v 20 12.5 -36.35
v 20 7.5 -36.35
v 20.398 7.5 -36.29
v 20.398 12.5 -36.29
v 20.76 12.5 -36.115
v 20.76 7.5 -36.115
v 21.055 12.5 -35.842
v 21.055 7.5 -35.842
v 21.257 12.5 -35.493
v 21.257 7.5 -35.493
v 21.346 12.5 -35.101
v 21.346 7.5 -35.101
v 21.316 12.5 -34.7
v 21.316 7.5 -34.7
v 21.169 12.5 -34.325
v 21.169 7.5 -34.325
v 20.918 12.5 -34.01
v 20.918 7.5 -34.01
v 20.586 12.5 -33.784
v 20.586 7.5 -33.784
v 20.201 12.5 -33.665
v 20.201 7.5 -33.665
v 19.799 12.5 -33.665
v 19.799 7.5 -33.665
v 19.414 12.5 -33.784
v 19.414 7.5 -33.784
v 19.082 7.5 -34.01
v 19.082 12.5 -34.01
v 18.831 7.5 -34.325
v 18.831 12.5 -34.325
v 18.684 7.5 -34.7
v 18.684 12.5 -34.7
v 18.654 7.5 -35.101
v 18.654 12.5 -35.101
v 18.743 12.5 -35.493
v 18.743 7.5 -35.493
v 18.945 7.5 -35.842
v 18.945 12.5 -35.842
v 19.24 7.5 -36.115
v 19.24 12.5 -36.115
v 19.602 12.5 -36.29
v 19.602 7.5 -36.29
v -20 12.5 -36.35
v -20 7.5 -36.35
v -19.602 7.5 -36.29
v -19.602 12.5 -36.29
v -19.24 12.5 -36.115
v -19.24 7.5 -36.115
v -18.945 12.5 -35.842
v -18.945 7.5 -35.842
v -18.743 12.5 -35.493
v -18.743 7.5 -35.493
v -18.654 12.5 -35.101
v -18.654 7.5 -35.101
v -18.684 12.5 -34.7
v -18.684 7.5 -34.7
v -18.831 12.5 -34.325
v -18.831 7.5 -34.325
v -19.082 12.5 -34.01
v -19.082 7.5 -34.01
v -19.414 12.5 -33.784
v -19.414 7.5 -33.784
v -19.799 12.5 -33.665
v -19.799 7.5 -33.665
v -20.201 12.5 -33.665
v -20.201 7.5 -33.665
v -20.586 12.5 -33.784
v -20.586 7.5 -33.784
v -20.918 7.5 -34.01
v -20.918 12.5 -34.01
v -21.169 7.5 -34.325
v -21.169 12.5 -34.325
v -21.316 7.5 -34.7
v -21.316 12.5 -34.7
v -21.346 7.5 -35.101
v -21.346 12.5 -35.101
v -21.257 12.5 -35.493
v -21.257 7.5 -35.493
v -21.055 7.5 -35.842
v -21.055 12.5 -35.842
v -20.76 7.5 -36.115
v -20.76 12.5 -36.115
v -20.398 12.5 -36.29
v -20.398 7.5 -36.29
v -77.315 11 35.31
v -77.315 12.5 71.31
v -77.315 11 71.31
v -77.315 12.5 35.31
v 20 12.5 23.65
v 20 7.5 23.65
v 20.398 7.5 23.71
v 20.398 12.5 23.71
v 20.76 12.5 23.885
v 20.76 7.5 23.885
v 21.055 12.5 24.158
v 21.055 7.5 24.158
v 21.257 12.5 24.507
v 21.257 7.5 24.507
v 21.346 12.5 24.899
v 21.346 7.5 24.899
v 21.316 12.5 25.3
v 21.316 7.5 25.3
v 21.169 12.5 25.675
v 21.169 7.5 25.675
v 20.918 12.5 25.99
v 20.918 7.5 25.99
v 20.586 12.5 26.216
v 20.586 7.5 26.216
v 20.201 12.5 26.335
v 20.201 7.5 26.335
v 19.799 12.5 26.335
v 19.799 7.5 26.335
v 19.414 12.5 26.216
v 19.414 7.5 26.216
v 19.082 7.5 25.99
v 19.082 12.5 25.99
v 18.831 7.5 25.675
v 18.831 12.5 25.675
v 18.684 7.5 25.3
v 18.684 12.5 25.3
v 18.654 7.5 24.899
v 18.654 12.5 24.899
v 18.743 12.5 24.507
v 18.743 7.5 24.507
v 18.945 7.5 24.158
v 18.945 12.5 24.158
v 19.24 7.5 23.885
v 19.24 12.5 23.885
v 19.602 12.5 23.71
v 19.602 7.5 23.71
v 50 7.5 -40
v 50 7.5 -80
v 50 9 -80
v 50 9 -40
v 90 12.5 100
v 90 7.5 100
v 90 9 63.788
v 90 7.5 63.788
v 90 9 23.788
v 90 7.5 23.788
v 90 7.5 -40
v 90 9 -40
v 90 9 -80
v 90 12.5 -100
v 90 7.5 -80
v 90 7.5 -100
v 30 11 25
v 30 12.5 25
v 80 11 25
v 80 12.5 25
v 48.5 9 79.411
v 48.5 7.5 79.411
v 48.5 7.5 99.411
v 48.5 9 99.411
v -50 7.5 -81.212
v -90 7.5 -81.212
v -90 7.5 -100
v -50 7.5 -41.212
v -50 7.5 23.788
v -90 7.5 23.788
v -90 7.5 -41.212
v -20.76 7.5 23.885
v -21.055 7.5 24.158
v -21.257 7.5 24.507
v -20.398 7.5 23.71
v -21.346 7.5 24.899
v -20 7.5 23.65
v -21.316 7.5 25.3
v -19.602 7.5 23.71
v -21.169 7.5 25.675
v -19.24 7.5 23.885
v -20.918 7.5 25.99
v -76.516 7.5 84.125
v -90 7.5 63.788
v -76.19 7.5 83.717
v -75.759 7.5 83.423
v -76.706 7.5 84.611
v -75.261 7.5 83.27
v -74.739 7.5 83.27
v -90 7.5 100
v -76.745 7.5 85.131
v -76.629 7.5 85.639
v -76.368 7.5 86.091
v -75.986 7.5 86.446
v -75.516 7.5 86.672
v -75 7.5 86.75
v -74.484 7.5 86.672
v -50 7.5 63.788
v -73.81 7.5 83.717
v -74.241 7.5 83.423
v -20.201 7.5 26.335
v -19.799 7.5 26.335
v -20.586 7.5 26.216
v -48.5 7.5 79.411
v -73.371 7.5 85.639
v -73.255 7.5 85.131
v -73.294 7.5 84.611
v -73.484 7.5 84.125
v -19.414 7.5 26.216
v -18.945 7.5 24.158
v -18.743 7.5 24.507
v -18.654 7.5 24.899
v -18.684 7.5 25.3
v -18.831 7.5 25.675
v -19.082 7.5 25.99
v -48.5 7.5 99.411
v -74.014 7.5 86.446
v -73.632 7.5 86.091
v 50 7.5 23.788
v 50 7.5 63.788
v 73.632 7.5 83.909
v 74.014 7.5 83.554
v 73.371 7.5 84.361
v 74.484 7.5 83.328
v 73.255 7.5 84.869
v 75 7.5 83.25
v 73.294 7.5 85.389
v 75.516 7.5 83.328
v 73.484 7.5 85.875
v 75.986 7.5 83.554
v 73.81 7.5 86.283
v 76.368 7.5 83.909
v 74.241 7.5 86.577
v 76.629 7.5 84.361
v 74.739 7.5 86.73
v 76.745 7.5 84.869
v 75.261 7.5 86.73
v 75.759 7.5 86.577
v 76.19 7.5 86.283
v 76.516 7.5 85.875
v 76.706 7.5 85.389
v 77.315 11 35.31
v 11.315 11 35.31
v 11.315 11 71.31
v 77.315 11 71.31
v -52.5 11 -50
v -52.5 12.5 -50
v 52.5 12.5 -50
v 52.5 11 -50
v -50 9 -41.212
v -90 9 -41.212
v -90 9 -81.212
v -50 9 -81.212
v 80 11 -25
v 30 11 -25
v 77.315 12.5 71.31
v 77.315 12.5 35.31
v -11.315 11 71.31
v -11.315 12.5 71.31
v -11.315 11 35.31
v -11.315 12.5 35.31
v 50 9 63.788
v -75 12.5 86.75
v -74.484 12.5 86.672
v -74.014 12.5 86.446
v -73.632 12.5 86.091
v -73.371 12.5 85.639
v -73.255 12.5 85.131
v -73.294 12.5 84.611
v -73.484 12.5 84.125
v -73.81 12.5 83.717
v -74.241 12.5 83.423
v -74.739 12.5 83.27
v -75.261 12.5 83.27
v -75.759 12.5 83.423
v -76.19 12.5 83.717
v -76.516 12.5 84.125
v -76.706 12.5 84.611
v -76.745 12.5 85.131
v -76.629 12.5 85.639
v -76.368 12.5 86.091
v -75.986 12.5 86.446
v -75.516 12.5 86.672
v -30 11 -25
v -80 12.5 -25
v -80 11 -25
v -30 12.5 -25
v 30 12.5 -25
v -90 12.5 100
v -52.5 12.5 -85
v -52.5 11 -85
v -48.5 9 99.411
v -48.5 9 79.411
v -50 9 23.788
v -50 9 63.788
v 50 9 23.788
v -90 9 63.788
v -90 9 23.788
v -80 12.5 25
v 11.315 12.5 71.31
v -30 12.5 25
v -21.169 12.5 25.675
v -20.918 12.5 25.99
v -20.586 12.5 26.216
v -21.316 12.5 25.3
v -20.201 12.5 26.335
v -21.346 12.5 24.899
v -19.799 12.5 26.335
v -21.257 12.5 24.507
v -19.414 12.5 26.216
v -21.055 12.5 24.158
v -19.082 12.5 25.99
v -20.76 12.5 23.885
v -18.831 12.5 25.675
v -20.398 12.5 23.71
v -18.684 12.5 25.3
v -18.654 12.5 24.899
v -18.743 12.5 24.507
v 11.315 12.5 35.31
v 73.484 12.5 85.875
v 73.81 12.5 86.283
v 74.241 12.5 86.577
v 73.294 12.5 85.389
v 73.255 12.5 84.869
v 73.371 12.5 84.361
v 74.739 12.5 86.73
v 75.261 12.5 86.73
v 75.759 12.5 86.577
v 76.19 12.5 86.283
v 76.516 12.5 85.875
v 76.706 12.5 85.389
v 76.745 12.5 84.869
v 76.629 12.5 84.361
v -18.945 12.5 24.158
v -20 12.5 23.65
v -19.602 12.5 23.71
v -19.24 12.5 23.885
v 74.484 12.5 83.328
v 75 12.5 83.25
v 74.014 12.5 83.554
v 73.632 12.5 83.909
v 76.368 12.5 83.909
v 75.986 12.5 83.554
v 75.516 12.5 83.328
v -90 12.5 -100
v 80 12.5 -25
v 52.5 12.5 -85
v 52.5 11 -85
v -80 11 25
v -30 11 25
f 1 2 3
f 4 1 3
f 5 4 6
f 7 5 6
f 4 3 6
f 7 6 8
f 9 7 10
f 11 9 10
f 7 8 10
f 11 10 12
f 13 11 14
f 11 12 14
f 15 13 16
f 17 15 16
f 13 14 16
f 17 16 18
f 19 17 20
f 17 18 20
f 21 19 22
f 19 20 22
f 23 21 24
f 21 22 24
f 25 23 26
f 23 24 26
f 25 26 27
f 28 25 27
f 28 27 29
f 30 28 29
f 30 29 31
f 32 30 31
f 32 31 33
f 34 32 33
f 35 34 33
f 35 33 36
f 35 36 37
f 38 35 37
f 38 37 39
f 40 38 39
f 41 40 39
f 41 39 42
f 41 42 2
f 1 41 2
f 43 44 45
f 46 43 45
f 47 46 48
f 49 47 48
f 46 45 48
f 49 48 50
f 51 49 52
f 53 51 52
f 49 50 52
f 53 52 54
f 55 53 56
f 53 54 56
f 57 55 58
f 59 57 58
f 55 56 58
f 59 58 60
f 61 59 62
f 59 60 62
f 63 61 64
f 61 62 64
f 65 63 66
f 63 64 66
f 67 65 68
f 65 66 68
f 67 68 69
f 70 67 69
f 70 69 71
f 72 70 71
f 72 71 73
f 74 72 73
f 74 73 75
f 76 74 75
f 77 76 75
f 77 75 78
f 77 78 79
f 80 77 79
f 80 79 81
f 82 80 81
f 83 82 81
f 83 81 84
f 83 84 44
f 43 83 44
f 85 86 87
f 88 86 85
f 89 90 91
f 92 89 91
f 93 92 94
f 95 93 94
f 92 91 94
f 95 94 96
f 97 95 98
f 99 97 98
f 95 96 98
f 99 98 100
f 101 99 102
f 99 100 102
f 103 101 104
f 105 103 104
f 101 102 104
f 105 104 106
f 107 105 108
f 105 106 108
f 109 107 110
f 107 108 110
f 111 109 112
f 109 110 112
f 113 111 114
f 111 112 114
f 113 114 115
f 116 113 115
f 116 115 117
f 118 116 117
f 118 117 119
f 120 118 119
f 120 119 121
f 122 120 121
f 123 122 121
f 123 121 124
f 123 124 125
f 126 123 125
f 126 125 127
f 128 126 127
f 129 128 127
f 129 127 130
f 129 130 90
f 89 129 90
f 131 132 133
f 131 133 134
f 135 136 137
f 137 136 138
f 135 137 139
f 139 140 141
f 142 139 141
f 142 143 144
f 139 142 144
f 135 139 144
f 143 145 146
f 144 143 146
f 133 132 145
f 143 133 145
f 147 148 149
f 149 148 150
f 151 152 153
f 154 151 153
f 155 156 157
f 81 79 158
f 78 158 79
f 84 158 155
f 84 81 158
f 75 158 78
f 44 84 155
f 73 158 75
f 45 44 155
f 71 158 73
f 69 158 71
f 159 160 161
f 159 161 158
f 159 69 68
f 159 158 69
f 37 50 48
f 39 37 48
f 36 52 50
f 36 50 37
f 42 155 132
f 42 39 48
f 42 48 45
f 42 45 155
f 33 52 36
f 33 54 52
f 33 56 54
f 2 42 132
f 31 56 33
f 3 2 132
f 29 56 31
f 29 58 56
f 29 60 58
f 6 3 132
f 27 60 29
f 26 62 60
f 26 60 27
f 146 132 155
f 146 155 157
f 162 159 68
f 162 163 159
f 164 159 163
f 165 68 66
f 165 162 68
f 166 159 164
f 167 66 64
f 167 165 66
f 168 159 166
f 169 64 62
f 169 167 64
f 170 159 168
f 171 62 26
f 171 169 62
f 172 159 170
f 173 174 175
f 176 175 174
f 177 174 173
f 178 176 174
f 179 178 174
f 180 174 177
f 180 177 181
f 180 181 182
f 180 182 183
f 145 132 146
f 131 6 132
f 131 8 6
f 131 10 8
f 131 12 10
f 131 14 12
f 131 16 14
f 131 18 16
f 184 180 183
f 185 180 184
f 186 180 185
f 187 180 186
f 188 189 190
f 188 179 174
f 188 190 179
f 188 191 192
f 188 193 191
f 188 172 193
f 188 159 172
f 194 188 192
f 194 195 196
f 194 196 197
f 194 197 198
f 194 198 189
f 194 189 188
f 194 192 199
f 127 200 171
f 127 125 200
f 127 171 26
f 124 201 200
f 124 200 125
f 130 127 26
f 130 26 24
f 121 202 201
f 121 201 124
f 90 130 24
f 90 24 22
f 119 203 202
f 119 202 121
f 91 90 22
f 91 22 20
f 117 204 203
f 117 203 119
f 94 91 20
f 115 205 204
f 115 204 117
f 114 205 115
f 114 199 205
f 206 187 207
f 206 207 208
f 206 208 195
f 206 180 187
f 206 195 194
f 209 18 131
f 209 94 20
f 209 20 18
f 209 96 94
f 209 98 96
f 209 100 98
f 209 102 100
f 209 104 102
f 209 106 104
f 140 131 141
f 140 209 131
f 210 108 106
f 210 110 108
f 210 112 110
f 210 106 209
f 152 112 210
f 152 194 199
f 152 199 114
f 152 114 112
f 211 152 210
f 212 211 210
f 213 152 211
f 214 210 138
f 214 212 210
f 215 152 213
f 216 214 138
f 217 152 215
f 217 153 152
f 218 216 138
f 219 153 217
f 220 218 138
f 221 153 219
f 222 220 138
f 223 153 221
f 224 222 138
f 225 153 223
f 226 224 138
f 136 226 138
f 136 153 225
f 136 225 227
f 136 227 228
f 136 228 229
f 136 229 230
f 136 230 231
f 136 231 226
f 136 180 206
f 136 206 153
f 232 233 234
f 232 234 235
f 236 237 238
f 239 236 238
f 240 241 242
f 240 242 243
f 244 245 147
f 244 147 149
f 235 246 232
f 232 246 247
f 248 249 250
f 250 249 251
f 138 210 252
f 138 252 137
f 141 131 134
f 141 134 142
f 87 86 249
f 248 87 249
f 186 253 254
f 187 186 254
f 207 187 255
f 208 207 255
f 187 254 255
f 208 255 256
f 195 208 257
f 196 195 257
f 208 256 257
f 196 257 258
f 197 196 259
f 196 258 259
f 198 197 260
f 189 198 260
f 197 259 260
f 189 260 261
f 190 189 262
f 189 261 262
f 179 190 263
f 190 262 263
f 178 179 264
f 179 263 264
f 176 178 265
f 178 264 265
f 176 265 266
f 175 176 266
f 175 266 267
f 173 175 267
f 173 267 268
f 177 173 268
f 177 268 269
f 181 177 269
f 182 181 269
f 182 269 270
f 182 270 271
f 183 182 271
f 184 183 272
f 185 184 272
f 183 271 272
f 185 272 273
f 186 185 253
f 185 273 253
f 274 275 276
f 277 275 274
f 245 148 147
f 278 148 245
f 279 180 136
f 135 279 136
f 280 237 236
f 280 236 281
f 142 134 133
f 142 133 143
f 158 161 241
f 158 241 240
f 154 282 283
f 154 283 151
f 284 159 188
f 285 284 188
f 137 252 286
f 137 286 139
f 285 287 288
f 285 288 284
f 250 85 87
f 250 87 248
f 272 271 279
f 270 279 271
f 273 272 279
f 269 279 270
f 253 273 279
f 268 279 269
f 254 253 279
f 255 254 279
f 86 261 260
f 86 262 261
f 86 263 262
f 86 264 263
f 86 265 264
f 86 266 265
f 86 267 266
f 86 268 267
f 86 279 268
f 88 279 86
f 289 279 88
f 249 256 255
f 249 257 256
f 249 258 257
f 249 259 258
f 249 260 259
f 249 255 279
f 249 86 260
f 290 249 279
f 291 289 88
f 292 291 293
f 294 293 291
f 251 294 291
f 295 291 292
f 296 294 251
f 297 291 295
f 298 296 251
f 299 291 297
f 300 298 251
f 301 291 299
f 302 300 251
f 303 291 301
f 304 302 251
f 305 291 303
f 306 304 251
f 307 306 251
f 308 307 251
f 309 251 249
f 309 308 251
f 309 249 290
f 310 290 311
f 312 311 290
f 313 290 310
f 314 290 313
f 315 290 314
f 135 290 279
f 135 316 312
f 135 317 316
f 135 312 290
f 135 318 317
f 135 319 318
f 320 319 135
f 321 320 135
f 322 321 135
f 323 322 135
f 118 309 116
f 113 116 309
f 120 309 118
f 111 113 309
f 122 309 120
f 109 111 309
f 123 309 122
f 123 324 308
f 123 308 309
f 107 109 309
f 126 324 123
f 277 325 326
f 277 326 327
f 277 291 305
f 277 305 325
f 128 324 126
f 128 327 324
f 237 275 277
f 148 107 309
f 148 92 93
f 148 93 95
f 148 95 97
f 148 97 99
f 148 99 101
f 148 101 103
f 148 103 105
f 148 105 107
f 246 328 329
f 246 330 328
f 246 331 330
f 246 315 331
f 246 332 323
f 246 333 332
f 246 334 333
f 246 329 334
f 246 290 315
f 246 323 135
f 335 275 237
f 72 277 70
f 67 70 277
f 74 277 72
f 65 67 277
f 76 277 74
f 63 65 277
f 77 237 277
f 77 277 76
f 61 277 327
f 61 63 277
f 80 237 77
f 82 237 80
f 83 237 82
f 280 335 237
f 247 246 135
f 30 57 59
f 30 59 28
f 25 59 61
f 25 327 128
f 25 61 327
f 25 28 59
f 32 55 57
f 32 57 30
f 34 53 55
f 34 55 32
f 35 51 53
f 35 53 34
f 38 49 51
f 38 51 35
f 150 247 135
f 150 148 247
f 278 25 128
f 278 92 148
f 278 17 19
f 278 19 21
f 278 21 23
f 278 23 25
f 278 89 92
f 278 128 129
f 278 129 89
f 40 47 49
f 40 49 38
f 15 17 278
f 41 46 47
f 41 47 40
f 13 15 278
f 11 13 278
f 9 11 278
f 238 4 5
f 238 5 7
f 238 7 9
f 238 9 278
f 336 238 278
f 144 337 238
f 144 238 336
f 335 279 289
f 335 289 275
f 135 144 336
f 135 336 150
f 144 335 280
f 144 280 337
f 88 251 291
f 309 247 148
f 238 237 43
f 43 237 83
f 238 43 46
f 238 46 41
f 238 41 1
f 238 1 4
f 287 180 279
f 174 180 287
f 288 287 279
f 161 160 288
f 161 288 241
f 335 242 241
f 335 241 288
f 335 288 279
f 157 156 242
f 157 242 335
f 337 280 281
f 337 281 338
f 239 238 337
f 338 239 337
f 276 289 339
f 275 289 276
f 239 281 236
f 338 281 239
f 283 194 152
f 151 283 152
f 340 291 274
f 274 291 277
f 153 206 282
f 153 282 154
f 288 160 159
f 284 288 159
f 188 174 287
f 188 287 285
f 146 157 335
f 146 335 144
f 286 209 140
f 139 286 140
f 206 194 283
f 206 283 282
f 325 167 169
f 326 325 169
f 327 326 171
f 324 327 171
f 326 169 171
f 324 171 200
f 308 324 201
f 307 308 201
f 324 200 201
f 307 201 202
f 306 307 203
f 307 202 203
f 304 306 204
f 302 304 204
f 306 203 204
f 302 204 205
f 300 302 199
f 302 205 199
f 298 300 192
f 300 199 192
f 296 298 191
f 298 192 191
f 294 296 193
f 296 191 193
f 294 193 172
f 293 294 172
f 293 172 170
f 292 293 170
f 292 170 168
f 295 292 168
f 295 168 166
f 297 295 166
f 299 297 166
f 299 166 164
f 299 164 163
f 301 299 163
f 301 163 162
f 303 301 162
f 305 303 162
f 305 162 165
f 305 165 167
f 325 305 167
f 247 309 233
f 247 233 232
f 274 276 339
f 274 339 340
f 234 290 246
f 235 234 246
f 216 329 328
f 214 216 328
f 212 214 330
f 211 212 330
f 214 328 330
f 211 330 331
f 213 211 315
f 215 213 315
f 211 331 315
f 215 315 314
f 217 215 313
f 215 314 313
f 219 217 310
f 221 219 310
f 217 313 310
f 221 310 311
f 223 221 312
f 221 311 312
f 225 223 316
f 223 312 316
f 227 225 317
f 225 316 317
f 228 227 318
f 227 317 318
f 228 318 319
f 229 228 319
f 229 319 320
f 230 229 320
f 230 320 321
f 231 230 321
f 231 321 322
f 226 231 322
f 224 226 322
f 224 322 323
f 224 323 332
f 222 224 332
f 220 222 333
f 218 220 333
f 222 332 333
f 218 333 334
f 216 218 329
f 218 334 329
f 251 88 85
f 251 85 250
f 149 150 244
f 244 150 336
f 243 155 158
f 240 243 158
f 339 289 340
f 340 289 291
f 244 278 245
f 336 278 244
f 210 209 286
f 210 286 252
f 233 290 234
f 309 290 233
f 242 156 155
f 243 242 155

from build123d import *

# Parameters (mm, degrees)
SKETCH1_W           = 180
SKETCH1_H           = 200
BOSS_EXTRUDE1_DEPTH = 12.5
SKETCH2_W           = 85
SKETCH2_H           = 55
CUT_EXTRUDE1_DEPTH  = 1.5
SKETCH3_W           = 105
SKETCH3_H           = 35
CUT_EXTRUDE2_DEPTH  = 1.5
SKETCH4_W           = 180
SKETCH4_H           = 200
CUT_EXTRUDE3_DEPTH  = 4.5
SKETCH5_W           = 180
SKETCH5_H           = 200
CUT_EXTRUDE4_DEPTH  = 3
SKETCH7_W           = 85
SKETCH7_H           = 55
BOSS_EXTRUDE2_DEPTH = 1.5
SKETCH8_W           = 50
SKETCH8_H           = 50
CUT_EXTRUDE5_DEPTH  = 1.5
SKETCH9_W           = 66
SKETCH9_H           = 36
CUT_EXTRUDE6_DEPTH  = 1.5
SKETCH11_W          = 80
SKETCH11_H          = 40
SKETCH11_W_2        = 97
SKETCH11_H_2        = 20
CUT_EXTRUDE9_DEPTH  = 1.5
SKETCH15_R          = 1.35
CUT_EXTRUDE11_DEPTH = 135.629120178
SKETCH16_R          = 1.75
CUT_EXTRUDE12_DEPTH = 5


with BuildPart() as part:
    # Sketch1 → Boss-Extrude1 (new body)
    with BuildSketch(Plane(origin=(0, 0, 0), x_dir=(1, 0, 0), z_dir=(0, 1, 0))):
        Rectangle(SKETCH1_W, SKETCH1_H)
    extrude(amount=BOSS_EXTRUDE1_DEPTH)

    # Sketch2 → Cut-Extrude1 (cut)
    with BuildSketch(Plane(origin=(0, 12.5, 0), x_dir=(1, 0, 0), z_dir=(0, 1, 0))):
        Rectangle(SKETCH2_W, SKETCH2_H)
    extrude(amount=-CUT_EXTRUDE1_DEPTH, mode=Mode.SUBTRACT)

    # Sketch3 → Cut-Extrude2 (cut)
    with BuildSketch(Plane(origin=(0, 12.5, 0), x_dir=(1, 0, 0), z_dir=(0, 1, 0))):
        with Locations((0, 67.5)):
            Rectangle(SKETCH3_W, SKETCH3_H)
    extrude(amount=-CUT_EXTRUDE2_DEPTH, mode=Mode.SUBTRACT)

    # Sketch4 → Cut-Extrude3 (cut)
    with BuildSketch(Plane.XZ):
        Rectangle(SKETCH4_W, SKETCH4_H)
    extrude(amount=-CUT_EXTRUDE3_DEPTH, mode=Mode.SUBTRACT)

    # Sketch5 → Cut-Extrude4 (cut)
    with BuildSketch(Plane.XZ.offset(-4.5)):
        Rectangle(SKETCH5_W, SKETCH5_H)
    extrude(amount=-CUT_EXTRUDE4_DEPTH, mode=Mode.SUBTRACT)

    # Sketch7 → Boss-Extrude2 (add)
    with BuildSketch(Plane(origin=(0, 11, 0), x_dir=(1, 0, 0), z_dir=(0, 1, 0))):
        Rectangle(SKETCH7_W, SKETCH7_H)
    extrude(amount=BOSS_EXTRUDE2_DEPTH)

    # Sketch8 → Cut-Extrude5 (cut)
    with BuildSketch(Plane(origin=(0, 12.5, 0), x_dir=(1, 0, 0), z_dir=(0, 1, 0))):
        with Locations((55, 0)):
            Rectangle(SKETCH8_W, SKETCH8_H)
        with Locations((-55, 0)):
            Rectangle(SKETCH8_W, SKETCH8_H)
    extrude(amount=-CUT_EXTRUDE5_DEPTH, mode=Mode.SUBTRACT)

    # Sketch9 → Cut-Extrude6 (cut)
    with BuildSketch(Plane(origin=(0, 12.5, 0), x_dir=(1, 0, 0), z_dir=(0, 1, 0))):
        with Locations((44.314846592, -53.31046024)):
            Rectangle(SKETCH9_W, SKETCH9_H)
        with Locations((-44.314846592, -53.31046024)):
            Rectangle(SKETCH9_W, SKETCH9_H)
    extrude(amount=-CUT_EXTRUDE6_DEPTH, mode=Mode.SUBTRACT)

    # Sketch11 → Cut-Extrude9 (cut)
    with BuildSketch(Plane.XZ.offset(-7.5)):
        with Locations((-90, 43.788146999)):
            Rectangle(SKETCH11_W, SKETCH11_H)
        with Locations((-90, -61.211853001)):
            Rectangle(SKETCH11_W, SKETCH11_H)
        with Locations((90, -60)):
            Rectangle(SKETCH11_W, SKETCH11_H)
        with Locations((0, 89.411235459)):
            Rectangle(SKETCH11_W_2, SKETCH11_H_2)
        with Locations((90, 43.788146999)):
            Rectangle(SKETCH11_W, SKETCH11_H)
    extrude(amount=-CUT_EXTRUDE9_DEPTH, mode=Mode.SUBTRACT)

    # Sketch15 → Cut-Extrude11 (cut, through all)
    with BuildSketch(Plane.XZ.offset(-7.5)):
        with Locations(Location((-20, 25, 0), (0, 0, 270))):
            Circle(SKETCH15_R)
        with Locations(Location((20, 25, 0), (0, 0, 270))):
            Circle(SKETCH15_R)
        with Locations(Location((-20, -35, 0), (0, 0, 270))):
            Circle(SKETCH15_R)
        with Locations(Location((20, -35, 0), (0, 0, 270))):
            Circle(SKETCH15_R)
    extrude(amount=-CUT_EXTRUDE11_DEPTH, mode=Mode.SUBTRACT)

    # Sketch16 → Cut-Extrude12 (cut)
    with BuildSketch(Plane(origin=(0, 12.5, 0), x_dir=(1, 0, 0), z_dir=(0, 1, 0))):
        with Locations(Location((-75, -85, 0), (0, 0, 270))):
            Circle(SKETCH16_R)
        with Locations(Location((75, -85, 0), (0, 0, 90))):
            Circle(SKETCH16_R)
    extrude(amount=-CUT_EXTRUDE12_DEPTH, mode=Mode.SUBTRACT)


solid = part.part
